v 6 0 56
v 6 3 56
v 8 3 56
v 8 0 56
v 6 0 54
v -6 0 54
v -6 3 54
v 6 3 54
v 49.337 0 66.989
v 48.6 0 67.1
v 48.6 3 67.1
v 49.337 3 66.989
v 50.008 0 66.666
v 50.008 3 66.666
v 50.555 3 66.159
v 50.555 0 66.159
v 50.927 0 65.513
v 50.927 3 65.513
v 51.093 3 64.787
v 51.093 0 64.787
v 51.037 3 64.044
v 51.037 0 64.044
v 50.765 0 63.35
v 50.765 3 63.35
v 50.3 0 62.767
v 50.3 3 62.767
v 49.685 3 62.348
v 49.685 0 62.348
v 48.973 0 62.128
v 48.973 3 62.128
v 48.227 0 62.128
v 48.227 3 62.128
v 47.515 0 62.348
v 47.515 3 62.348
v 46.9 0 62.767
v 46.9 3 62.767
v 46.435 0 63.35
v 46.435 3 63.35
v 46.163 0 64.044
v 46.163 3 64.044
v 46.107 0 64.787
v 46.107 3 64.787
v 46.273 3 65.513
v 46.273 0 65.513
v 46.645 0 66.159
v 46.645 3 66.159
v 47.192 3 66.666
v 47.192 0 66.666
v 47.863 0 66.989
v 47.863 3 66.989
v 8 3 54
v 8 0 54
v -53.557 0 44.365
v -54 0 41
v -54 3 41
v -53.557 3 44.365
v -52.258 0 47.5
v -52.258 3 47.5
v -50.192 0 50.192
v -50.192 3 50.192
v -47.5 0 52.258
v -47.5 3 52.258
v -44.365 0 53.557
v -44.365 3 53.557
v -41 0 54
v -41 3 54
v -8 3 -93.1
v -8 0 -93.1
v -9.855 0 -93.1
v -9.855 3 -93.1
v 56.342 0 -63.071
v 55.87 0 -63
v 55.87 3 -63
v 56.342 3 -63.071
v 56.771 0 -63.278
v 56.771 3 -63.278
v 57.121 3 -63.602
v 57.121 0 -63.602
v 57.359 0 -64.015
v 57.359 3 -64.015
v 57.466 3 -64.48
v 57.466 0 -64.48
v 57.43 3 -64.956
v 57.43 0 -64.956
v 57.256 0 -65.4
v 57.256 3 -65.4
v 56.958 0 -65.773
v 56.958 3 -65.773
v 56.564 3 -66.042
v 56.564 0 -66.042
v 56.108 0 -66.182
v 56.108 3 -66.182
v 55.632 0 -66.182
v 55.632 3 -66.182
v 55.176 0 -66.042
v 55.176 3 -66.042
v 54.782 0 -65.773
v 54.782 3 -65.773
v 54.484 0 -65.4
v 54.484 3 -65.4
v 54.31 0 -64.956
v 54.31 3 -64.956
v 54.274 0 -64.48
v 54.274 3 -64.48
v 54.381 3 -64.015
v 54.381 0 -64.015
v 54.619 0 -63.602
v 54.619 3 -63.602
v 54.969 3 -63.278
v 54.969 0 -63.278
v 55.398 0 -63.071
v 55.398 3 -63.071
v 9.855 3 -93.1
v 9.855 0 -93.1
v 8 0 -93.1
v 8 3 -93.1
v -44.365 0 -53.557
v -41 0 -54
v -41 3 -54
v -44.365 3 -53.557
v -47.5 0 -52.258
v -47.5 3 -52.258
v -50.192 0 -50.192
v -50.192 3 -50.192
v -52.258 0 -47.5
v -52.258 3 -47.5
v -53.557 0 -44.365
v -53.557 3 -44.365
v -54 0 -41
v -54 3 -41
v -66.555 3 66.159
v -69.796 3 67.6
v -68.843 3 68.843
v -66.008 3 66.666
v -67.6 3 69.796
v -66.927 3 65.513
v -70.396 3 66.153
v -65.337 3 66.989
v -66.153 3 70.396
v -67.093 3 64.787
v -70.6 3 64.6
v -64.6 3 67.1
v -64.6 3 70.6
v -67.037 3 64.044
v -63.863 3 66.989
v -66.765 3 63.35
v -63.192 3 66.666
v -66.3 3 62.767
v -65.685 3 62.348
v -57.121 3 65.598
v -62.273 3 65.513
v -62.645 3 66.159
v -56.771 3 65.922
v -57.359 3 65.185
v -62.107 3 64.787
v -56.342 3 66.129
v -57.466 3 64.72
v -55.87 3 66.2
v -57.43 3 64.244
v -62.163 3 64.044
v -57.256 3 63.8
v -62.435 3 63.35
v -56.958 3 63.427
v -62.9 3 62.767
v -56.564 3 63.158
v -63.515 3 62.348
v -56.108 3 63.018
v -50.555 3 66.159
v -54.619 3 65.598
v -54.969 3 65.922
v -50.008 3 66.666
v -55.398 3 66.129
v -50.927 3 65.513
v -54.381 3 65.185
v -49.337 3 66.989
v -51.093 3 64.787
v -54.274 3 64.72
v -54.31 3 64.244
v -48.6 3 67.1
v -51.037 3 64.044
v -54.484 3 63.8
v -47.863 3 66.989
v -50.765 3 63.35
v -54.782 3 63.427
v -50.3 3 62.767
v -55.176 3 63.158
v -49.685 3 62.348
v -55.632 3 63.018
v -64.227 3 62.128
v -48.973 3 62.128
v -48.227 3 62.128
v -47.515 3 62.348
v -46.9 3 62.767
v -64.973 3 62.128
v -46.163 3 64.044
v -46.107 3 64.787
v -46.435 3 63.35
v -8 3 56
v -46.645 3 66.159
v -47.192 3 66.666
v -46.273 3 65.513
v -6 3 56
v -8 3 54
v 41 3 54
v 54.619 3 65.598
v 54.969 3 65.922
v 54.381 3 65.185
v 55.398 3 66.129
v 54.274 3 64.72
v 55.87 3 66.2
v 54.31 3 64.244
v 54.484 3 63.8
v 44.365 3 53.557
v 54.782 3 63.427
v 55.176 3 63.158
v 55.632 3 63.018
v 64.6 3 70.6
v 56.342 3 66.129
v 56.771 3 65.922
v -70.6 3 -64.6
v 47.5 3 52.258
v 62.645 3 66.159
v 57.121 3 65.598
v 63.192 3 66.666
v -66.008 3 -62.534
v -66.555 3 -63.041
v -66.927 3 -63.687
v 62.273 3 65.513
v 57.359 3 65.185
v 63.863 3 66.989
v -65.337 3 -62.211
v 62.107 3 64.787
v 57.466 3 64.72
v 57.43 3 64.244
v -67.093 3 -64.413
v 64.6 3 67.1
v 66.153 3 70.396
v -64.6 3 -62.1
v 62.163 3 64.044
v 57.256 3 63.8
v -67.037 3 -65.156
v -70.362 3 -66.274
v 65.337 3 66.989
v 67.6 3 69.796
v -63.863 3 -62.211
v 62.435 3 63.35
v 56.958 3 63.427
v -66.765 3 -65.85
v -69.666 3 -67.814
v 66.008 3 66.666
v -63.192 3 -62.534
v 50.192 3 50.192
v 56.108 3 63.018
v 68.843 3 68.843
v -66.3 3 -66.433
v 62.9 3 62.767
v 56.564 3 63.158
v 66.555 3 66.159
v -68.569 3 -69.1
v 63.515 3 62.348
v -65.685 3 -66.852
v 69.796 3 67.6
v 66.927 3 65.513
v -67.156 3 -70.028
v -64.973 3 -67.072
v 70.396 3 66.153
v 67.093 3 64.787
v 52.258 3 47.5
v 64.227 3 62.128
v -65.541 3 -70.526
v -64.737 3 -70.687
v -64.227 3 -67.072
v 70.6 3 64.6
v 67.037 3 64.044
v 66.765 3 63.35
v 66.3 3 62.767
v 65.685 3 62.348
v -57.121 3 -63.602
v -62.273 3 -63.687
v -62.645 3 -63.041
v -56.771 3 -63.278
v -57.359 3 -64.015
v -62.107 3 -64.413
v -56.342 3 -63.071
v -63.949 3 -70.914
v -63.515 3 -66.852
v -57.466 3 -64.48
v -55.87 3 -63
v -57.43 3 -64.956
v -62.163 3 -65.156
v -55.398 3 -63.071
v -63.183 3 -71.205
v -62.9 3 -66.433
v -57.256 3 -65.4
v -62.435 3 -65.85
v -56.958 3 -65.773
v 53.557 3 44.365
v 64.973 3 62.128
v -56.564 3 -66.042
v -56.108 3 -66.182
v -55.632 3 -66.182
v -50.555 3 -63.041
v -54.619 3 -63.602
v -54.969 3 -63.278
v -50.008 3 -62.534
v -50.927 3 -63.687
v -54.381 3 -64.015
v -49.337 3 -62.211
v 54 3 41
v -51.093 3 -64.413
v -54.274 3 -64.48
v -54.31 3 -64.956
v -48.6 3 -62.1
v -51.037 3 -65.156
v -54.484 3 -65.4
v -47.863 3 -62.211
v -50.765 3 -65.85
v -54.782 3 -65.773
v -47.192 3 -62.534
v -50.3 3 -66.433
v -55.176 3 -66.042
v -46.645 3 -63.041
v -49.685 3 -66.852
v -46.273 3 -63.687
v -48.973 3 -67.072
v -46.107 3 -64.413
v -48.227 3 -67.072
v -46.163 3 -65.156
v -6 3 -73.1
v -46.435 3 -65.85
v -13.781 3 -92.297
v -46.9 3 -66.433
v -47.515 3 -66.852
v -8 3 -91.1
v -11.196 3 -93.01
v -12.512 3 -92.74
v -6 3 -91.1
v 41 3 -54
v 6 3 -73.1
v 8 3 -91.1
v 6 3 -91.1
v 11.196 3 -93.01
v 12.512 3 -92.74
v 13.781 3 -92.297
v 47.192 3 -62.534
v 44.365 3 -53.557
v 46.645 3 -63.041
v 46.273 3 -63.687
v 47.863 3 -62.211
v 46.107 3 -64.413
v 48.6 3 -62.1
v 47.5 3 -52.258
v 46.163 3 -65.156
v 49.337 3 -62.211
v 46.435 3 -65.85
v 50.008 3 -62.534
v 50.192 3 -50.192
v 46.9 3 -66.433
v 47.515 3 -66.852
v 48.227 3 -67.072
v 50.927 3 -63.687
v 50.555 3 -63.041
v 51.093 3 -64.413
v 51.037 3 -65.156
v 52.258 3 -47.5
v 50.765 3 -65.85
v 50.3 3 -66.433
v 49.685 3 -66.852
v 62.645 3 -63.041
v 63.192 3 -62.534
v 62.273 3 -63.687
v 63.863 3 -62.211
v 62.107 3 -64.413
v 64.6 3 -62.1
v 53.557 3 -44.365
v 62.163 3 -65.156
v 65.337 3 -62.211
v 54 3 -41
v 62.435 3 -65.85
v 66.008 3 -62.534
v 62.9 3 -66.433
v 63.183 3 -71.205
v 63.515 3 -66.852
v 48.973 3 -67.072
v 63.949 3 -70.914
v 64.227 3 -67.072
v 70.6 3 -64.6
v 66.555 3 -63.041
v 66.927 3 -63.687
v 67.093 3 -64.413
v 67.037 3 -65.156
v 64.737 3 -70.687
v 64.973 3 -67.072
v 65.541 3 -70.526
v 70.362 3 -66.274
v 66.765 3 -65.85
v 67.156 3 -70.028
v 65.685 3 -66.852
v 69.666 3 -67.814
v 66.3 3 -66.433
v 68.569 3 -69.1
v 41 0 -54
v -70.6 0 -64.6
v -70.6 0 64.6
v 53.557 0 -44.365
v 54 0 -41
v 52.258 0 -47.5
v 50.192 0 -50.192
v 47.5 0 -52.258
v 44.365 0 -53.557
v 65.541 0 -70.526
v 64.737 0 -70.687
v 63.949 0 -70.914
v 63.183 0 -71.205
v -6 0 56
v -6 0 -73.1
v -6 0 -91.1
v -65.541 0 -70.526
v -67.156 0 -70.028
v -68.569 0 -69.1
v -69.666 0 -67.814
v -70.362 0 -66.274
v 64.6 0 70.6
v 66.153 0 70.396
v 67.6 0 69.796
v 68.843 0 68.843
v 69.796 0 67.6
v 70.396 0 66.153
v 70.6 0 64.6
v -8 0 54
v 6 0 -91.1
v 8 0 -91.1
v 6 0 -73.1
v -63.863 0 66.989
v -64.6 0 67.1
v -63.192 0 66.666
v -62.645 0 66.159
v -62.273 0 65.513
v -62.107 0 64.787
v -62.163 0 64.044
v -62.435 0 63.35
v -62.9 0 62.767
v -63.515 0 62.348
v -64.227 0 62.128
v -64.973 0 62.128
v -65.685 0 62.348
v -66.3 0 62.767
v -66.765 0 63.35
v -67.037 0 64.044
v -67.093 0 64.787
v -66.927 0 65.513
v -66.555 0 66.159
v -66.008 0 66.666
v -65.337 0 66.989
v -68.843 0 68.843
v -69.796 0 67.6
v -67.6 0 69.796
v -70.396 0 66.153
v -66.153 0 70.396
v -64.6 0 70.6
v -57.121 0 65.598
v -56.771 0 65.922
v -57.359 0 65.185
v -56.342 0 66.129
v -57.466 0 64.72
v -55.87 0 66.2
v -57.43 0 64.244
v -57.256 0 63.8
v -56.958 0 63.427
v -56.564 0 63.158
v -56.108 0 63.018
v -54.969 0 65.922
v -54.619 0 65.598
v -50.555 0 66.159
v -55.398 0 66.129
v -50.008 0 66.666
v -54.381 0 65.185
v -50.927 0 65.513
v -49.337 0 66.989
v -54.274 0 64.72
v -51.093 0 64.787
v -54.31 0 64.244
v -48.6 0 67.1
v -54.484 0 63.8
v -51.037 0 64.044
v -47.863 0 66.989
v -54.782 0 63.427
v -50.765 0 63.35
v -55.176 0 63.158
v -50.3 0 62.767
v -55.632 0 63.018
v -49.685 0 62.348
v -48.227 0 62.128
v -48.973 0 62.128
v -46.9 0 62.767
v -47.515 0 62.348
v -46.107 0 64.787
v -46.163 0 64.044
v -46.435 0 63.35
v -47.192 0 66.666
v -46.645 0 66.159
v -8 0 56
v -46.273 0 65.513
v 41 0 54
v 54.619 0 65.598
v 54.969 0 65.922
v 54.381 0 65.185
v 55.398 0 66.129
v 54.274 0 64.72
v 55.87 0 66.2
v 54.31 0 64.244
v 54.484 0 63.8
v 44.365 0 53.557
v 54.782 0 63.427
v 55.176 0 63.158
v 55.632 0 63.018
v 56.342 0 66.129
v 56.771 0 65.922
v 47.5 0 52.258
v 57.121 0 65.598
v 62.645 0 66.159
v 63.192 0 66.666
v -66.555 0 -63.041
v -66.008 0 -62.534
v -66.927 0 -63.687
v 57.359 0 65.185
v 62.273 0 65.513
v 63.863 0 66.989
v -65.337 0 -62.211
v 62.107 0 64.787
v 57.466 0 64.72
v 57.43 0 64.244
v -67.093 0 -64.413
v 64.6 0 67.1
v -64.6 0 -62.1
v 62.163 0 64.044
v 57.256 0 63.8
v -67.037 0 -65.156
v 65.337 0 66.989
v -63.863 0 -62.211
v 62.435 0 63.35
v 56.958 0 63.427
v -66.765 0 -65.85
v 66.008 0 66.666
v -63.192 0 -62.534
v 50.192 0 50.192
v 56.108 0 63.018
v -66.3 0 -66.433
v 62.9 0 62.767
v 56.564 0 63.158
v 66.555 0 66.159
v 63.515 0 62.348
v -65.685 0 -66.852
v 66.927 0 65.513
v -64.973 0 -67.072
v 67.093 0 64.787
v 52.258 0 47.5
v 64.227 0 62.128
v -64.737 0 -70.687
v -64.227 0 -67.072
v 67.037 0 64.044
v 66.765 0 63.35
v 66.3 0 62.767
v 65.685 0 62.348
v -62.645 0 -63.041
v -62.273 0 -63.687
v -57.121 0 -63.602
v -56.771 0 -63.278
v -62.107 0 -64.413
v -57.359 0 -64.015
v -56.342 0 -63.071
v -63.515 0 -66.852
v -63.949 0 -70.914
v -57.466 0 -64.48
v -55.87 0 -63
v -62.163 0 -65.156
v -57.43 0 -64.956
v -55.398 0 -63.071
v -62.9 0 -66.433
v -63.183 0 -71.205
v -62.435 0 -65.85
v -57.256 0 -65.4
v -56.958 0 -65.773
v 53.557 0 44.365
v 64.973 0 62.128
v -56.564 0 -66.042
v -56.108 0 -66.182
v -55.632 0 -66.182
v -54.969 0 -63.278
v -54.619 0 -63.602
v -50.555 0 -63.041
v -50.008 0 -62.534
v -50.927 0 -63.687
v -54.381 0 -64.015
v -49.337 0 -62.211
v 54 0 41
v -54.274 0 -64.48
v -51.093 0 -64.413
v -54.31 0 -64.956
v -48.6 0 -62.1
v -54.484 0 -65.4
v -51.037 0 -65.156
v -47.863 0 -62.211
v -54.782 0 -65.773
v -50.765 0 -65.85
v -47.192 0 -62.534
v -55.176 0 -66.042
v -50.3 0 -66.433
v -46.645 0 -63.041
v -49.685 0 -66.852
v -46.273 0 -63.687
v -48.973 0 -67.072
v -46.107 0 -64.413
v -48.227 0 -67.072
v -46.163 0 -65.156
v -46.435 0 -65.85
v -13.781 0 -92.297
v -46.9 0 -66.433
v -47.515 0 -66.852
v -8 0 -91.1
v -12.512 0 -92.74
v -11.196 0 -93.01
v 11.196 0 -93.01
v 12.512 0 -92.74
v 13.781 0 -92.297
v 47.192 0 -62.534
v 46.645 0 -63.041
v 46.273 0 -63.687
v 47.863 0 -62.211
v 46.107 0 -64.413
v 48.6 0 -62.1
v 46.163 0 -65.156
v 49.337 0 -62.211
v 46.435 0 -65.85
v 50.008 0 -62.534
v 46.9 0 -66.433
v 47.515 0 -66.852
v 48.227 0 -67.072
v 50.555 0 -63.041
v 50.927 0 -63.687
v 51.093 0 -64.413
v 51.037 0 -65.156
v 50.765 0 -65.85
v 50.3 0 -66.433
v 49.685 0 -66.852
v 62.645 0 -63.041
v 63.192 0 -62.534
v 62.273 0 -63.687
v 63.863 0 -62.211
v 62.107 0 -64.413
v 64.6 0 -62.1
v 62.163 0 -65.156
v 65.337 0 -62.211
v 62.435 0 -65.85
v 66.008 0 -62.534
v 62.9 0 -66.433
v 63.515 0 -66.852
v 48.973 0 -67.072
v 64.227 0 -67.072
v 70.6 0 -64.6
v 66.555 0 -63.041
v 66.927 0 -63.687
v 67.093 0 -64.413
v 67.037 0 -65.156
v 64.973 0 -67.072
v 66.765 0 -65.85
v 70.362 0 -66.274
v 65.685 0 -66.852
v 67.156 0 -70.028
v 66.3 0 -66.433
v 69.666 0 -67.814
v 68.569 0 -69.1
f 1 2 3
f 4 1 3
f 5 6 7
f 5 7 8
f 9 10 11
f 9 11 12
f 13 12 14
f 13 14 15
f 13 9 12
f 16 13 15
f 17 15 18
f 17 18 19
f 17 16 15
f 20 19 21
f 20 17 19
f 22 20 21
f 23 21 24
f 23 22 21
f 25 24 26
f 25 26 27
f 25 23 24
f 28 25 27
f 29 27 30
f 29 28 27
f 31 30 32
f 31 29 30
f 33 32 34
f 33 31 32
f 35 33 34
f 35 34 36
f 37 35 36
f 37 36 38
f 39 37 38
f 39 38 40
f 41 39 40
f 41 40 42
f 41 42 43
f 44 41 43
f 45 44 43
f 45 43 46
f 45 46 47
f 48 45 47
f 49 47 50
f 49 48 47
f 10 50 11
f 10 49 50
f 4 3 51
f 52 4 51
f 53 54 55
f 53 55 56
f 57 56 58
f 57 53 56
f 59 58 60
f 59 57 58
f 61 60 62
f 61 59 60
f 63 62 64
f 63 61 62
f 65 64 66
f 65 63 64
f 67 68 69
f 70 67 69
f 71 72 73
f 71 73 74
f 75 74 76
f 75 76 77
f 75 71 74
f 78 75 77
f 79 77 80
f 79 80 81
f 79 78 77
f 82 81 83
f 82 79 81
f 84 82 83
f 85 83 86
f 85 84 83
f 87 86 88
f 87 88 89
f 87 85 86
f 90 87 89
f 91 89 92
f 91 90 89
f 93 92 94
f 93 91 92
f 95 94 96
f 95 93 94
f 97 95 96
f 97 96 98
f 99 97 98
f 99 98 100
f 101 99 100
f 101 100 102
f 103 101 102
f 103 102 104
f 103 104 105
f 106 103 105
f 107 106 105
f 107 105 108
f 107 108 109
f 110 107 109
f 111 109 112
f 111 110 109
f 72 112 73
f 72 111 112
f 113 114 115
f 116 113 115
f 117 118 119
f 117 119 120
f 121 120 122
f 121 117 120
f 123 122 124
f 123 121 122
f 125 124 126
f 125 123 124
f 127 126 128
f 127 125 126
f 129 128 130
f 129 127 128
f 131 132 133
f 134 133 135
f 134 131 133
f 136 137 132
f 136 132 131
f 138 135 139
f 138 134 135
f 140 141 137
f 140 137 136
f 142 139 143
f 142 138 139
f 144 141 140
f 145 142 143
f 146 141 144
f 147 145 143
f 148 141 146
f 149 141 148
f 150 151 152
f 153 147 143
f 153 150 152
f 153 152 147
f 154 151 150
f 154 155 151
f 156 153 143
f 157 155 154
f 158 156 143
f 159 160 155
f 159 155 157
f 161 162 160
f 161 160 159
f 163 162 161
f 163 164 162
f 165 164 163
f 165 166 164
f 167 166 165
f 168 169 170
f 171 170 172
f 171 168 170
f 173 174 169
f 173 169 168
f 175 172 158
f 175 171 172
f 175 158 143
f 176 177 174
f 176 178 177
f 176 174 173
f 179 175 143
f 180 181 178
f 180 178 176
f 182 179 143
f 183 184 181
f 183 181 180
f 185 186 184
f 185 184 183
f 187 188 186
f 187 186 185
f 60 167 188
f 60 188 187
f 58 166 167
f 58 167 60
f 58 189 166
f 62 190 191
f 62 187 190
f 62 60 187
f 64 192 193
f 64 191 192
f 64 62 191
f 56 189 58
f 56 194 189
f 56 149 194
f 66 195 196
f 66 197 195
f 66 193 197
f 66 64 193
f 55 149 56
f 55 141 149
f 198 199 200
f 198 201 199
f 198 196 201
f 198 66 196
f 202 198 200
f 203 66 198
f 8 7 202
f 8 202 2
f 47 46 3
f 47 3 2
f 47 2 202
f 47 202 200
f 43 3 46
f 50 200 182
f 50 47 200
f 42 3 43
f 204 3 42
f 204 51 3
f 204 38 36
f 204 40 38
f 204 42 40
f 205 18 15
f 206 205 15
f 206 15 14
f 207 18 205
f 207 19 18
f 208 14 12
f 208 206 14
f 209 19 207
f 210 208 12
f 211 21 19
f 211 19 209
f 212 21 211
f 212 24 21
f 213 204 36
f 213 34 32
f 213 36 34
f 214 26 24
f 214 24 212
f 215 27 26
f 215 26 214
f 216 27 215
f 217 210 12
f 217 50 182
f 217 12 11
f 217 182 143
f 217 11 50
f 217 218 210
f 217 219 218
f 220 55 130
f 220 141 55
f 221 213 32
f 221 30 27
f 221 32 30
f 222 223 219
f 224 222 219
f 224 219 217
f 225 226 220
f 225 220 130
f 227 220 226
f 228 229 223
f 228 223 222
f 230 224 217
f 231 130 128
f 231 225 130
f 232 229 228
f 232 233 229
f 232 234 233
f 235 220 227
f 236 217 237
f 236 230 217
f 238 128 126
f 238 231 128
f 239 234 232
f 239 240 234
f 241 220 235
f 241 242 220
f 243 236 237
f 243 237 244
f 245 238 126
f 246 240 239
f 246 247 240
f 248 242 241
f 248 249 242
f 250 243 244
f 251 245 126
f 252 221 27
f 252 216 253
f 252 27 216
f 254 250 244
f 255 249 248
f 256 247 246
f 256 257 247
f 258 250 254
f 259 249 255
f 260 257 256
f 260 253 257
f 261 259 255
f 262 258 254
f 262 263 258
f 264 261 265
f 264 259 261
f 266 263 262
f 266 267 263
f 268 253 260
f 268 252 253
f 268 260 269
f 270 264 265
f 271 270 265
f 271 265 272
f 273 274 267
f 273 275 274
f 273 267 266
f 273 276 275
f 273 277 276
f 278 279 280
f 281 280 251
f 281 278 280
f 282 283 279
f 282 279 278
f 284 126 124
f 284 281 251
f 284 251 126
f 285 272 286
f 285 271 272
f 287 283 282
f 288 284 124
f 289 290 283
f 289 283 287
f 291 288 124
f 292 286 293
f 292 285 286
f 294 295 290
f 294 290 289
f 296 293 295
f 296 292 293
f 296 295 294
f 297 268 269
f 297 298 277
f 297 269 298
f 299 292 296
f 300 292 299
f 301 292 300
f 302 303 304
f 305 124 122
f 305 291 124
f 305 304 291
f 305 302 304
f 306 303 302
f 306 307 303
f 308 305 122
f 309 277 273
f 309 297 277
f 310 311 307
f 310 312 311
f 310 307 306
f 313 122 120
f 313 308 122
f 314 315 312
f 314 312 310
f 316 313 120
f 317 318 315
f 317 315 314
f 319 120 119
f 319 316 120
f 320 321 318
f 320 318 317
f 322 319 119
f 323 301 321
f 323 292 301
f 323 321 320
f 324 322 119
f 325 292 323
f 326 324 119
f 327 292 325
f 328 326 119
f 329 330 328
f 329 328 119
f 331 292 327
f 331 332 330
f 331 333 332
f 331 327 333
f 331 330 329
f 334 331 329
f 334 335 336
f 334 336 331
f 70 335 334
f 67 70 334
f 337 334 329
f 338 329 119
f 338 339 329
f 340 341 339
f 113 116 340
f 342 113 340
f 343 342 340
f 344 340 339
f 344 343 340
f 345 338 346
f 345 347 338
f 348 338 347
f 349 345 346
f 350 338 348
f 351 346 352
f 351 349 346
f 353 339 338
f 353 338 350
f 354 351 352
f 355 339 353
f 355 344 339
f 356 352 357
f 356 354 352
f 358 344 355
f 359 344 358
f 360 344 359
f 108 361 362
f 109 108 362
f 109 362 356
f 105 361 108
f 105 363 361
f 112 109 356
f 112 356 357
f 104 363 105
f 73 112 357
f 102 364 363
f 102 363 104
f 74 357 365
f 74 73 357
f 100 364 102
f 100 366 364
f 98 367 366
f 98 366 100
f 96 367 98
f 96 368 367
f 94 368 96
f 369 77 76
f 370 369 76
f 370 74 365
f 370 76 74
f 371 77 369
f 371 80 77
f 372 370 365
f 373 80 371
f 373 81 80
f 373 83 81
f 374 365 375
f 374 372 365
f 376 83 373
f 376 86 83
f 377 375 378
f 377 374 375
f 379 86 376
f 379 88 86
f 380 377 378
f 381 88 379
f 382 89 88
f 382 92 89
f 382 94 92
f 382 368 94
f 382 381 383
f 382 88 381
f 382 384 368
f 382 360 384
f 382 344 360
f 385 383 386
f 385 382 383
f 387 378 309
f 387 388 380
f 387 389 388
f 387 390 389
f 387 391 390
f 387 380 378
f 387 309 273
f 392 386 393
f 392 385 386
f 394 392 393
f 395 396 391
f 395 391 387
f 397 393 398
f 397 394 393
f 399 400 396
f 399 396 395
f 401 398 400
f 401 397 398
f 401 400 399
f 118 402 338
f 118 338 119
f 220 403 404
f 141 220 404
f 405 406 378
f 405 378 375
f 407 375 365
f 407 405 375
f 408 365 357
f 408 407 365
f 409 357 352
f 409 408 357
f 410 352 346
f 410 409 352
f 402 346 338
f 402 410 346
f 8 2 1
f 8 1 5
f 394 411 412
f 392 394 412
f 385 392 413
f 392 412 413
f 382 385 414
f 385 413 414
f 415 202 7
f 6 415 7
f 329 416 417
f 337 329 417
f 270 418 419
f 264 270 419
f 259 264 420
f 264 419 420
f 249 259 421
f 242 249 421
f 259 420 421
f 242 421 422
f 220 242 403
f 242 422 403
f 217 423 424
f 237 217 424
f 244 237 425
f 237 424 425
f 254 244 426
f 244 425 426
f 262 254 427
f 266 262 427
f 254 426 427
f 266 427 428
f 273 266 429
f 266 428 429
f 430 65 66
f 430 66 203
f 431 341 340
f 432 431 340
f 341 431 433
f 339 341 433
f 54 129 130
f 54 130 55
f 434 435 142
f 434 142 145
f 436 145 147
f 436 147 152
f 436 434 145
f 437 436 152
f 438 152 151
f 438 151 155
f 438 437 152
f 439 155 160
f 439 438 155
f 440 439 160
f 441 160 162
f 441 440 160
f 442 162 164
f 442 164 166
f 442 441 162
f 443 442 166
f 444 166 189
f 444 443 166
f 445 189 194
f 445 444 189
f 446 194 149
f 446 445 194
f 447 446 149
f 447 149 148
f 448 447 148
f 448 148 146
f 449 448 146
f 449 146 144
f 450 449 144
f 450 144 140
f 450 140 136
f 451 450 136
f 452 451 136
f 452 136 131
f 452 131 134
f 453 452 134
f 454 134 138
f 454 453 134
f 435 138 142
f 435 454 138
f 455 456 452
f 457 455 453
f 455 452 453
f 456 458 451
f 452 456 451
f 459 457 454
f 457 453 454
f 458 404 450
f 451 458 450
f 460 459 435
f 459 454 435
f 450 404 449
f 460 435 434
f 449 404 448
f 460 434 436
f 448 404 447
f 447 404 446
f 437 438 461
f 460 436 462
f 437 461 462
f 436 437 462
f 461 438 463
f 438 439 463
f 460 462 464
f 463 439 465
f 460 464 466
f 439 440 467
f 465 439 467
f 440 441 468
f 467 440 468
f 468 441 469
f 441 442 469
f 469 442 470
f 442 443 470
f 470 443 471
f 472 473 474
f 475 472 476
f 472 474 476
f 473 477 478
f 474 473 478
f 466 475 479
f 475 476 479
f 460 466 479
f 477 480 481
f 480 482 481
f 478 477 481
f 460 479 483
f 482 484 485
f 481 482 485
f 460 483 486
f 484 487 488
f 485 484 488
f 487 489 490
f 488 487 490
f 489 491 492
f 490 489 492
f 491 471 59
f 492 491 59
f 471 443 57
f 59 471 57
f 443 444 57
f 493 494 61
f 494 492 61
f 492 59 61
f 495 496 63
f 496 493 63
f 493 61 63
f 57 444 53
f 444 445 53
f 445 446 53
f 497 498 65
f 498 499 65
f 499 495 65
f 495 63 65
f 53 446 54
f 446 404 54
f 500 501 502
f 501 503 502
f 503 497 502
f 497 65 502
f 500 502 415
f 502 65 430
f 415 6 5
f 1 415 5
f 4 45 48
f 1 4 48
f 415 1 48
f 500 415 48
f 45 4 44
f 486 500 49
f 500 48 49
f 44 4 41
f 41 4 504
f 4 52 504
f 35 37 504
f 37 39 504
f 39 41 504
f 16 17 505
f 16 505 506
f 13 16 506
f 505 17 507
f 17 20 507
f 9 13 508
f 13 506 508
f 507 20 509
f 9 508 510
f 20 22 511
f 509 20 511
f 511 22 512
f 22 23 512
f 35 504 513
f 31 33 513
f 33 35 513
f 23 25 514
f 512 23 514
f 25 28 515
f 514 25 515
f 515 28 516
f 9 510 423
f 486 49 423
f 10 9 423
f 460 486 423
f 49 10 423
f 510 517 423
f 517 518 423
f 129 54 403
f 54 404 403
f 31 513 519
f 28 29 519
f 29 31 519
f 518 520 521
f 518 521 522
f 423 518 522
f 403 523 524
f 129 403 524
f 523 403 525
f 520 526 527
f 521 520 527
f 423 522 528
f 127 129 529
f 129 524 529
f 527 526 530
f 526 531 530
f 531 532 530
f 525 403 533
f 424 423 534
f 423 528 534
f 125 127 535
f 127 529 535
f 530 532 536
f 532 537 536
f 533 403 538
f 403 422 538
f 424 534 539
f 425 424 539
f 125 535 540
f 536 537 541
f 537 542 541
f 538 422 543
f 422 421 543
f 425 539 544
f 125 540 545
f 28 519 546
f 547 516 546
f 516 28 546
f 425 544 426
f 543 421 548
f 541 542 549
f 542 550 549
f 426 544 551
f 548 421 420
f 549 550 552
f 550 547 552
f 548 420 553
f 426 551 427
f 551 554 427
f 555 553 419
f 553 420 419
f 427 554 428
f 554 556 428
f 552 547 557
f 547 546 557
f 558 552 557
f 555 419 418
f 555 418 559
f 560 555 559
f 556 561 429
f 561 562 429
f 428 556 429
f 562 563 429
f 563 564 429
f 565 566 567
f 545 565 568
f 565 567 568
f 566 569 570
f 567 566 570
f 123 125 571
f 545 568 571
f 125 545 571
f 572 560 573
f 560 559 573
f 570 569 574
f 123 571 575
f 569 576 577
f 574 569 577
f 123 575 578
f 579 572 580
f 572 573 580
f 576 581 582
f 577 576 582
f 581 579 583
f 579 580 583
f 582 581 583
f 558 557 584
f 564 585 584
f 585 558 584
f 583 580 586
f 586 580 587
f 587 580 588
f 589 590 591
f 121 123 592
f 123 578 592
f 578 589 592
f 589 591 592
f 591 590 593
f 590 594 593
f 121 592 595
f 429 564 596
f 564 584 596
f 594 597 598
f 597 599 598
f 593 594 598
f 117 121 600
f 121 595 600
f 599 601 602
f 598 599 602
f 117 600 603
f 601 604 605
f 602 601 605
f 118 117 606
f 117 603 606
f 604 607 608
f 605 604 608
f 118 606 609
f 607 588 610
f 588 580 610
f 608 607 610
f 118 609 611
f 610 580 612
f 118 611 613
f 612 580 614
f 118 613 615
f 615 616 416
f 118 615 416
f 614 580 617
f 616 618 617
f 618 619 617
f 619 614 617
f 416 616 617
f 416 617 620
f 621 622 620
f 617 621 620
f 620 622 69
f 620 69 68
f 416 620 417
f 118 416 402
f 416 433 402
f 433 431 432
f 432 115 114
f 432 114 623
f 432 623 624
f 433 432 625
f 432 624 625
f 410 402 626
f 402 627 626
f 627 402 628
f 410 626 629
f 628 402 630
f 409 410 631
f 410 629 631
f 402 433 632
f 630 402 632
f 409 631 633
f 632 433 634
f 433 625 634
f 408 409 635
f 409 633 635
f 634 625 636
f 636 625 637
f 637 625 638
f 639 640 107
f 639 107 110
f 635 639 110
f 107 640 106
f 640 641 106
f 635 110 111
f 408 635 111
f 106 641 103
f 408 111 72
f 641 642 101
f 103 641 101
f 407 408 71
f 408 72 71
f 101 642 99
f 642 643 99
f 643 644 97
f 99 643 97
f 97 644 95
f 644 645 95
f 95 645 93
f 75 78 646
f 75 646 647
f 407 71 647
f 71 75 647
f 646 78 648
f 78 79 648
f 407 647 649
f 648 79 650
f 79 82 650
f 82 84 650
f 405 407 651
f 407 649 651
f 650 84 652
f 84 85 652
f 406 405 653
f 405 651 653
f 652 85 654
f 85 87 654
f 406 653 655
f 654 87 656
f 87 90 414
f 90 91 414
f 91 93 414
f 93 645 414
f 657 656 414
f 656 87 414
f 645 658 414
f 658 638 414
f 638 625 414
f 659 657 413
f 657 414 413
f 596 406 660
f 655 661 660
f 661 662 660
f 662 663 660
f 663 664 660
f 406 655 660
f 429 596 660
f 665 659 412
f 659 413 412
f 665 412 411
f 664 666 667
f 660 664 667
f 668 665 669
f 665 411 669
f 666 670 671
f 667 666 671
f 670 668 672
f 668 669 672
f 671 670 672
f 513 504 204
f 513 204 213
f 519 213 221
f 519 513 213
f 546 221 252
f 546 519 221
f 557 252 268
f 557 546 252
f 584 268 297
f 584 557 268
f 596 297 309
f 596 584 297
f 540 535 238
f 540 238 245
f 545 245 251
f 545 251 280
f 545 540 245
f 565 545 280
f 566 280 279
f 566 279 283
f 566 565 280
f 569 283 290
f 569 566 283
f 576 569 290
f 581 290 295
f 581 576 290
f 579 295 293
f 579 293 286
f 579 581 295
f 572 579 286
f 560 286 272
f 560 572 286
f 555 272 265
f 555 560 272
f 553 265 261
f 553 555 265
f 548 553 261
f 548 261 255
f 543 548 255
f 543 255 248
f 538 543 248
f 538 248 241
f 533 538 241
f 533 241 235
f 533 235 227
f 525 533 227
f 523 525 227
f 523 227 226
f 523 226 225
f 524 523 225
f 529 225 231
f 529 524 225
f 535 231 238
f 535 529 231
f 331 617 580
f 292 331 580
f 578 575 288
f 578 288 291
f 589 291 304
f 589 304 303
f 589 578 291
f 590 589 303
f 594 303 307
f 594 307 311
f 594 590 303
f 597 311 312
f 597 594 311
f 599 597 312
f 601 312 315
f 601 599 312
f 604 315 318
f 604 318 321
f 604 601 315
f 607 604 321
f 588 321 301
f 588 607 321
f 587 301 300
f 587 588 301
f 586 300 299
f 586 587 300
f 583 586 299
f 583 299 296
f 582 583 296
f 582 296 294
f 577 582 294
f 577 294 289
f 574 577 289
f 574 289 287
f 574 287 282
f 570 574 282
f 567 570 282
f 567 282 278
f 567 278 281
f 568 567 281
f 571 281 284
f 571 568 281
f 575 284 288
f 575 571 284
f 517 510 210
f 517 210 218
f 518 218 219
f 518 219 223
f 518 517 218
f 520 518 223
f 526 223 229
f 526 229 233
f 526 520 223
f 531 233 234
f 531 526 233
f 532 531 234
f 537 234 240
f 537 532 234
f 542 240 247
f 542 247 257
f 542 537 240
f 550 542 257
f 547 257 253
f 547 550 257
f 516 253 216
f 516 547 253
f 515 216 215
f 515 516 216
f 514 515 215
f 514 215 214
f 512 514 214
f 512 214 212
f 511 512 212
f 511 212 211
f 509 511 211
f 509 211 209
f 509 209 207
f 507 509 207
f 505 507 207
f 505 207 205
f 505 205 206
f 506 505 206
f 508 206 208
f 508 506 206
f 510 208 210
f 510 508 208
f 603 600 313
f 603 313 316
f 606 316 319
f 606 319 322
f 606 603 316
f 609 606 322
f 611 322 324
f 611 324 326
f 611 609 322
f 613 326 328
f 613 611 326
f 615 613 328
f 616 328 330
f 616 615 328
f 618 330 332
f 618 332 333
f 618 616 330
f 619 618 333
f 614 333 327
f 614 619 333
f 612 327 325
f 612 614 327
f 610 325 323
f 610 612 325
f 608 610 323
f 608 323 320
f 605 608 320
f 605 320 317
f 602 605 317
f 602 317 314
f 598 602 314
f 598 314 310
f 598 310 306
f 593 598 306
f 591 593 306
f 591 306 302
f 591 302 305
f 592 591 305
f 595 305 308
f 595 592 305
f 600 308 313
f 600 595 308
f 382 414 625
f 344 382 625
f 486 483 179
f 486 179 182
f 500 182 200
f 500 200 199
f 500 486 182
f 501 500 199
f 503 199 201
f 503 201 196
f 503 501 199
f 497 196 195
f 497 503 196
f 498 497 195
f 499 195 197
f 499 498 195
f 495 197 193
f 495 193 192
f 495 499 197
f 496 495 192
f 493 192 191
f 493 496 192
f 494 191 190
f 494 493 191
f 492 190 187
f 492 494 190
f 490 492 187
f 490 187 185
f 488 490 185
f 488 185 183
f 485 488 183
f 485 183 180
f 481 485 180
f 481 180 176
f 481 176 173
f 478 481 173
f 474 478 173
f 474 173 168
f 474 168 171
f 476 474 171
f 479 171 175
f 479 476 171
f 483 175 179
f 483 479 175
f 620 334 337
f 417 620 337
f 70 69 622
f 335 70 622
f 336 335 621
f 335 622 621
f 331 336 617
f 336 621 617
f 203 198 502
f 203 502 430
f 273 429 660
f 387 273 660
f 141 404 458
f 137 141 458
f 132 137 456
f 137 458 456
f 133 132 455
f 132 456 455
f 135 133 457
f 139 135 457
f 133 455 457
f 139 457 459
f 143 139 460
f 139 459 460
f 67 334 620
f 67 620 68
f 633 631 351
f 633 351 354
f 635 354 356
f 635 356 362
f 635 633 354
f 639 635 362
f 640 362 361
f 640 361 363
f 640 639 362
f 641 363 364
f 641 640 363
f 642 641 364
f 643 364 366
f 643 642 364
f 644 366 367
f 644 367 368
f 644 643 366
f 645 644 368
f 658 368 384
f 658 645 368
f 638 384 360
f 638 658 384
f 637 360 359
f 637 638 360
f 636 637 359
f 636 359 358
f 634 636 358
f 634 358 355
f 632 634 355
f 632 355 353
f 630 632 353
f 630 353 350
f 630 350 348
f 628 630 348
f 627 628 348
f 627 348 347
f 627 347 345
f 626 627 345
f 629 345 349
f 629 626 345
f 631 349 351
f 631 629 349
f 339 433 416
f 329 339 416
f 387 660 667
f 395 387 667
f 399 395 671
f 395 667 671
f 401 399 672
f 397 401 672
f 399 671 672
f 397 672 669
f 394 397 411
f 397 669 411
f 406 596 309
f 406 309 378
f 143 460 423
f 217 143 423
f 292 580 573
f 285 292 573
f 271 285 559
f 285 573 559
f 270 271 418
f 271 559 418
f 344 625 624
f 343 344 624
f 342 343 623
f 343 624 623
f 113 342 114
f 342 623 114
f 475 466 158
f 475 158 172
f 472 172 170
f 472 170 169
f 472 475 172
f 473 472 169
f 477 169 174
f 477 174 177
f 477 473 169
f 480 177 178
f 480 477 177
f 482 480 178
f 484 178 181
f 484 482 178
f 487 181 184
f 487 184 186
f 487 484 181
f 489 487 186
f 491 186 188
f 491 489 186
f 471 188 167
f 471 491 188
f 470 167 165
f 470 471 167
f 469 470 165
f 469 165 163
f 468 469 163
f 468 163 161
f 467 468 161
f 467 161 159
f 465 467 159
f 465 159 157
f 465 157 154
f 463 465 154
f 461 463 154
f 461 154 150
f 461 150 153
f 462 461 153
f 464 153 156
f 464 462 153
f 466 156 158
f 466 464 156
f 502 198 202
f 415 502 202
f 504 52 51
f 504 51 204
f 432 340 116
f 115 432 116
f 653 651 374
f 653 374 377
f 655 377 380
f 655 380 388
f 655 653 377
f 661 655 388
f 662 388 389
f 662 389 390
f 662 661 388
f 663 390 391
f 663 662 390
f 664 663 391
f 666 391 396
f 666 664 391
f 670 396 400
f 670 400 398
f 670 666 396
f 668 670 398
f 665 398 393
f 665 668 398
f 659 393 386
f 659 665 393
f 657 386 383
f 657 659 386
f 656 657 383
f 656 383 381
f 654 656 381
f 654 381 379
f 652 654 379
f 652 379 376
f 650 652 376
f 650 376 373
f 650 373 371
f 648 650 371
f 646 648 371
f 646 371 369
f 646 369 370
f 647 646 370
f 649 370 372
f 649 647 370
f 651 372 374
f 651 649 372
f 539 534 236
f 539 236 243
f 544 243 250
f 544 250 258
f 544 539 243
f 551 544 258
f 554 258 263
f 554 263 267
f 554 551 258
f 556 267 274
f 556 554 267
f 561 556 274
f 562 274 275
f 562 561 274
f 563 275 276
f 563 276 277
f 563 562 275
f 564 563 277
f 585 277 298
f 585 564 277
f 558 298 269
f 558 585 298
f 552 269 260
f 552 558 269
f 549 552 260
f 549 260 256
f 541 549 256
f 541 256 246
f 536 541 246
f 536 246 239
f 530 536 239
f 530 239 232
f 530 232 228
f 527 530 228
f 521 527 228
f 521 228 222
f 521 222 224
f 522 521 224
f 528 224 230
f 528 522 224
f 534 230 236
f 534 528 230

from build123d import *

# Parameters (mm, degrees)
SKETCH1_R           = 2.5
SKETCH1_R_2         = 1.6
BOSS_EXTRUDE1_DEPTH = 3
SKETCH2_W           = 2
SKETCH2_H           = 2
CUT_EXTRUDE1_DEPTH  = 117.880152293


with BuildPart() as part:
    # Sketch1 → Boss-Extrude1 (new body)
    with BuildSketch(Plane(origin=(0, 0, 0), x_dir=(1, 0, 0), z_dir=(0, 1, 0))):
        with BuildLine():
            Line((-64.6, -70.6), (64.6, -70.6))
            ThreePointArc((64.6, -70.6), (68.842640687, -68.842640687), (70.6, -64.6))
            Line((70.6, -64.6), (70.6, 64.6))
            ThreePointArc((70.6, 64.6), (69.163190657, 68.495804286), (65.540902989, 70.525765905))
            ThreePointArc((65.540902989, 70.525765905), (64.340790015, 70.792848887), (63.182522555, 71.205184867))
            Line((63.182522555, 71.205184867), (13.781138102, 92.296857547))
            ThreePointArc((13.781138102, 92.296857547), (11.858510235, 92.897157125), (9.854586018, 93.1))
            Line((9.854586018, 93.1), (6, 93.1))
            Line((6, 93.1), (6, 73.1))
            Line((6, 73.1), (-6, 73.1))
            Line((-6, 73.1), (-6, 93.1))
            Line((-6, 93.1), (-9.854586018, 93.1))
            ThreePointArc((-9.854586018, 93.1), (-11.858510235, 92.897157125), (-13.781138102, 92.296857547))
            Line((-13.781138102, 92.296857547), (-63.182522555, 71.205184867))
            ThreePointArc((-63.182522555, 71.205184867), (-64.340790015, 70.792848887), (-65.540902989, 70.525765905))
            ThreePointArc((-65.540902989, 70.525765905), (-69.163190657, 68.495804286), (-70.6, 64.6))
            Line((-70.6, 64.6), (-70.6, -64.6))
            ThreePointArc((-70.6, -64.6), (-68.842640687, -68.842640687), (-64.6, -70.6))
        make_face()
        with Locations(Location((64.6, -64.6, 0), (0, 0, 270))):
            Circle(SKETCH1_R, mode=Mode.SUBTRACT)
        with Locations(Location((48.6, -64.6, 0), (0, 0, 270))):
            Circle(SKETCH1_R, mode=Mode.SUBTRACT)
        with Locations(Location((-55.87, 64.6, 0), (0, 0, 270))):
            Circle(SKETCH1_R_2, mode=Mode.SUBTRACT)
        with Locations(Location((55.87, -64.6, 0), (0, 0, 270))):
            Circle(SKETCH1_R_2, mode=Mode.SUBTRACT)
        with Locations(Location((-48.6, 64.6, 0), (0, 0, 270))):
            Circle(SKETCH1_R, mode=Mode.SUBTRACT)
        with Locations(Location((55.87, 64.6, 0), (0, 0, 270))):
            Circle(SKETCH1_R_2, mode=Mode.SUBTRACT)
        with Locations(Location((48.6, 64.6, 0), (0, 0, 270))):
            Circle(SKETCH1_R, mode=Mode.SUBTRACT)
        with Locations(Location((64.6, 64.6, 0), (0, 0, 270))):
            Circle(SKETCH1_R, mode=Mode.SUBTRACT)
        with Locations(Location((-55.87, -64.6, 0), (0, 0, 270))):
            Circle(SKETCH1_R_2, mode=Mode.SUBTRACT)
        with Locations(Location((-48.6, -64.6, 0), (0, 0, 270))):
            Circle(SKETCH1_R, mode=Mode.SUBTRACT)
        with Locations(Location((-64.6, -64.6, 0), (0, 0, 270))):
            Circle(SKETCH1_R, mode=Mode.SUBTRACT)
        with Locations(Location((-64.6, 64.6, 0), (0, 0, 270))):
            Circle(SKETCH1_R, mode=Mode.SUBTRACT)
        with BuildLine():
            ThreePointArc((-41, 54), (-50.192388155, 50.192388155), (-54, 41))
            Line((-54, 41), (-54, -41))
            ThreePointArc((-54, -41), (-50.192388155, -50.192388155), (-41, -54))
            Line((-41, -54), (41, -54))
            ThreePointArc((41, -54), (50.192388155, -50.192388155), (54, -41))
            Line((54, -41), (54, 41))
            ThreePointArc((54, 41), (50.192388155, 50.192388155), (41, 54))
            Line((41, 54), (-41, 54))
        make_face(mode=Mode.SUBTRACT)
    extrude(amount=BOSS_EXTRUDE1_DEPTH)

    # Sketch2 → Cut-Extrude1 (cut, through all)
    with BuildSketch(Plane(origin=(0, 3, 0), x_dir=(1, 0, 0), z_dir=(0, 1, 0))):
        with Locations((-7, 92.1)):
            Rectangle(SKETCH2_W, SKETCH2_H)
        with Locations((7, 92.1)):
            Rectangle(SKETCH2_W, SKETCH2_H)
        with Locations((-7, -55)):
            Rectangle(SKETCH2_W, SKETCH2_H)
        with Locations((7, -55)):
            Rectangle(SKETCH2_W, SKETCH2_H)
    extrude(amount=-CUT_EXTRUDE1_DEPTH, mode=Mode.SUBTRACT)


solid = part.part
